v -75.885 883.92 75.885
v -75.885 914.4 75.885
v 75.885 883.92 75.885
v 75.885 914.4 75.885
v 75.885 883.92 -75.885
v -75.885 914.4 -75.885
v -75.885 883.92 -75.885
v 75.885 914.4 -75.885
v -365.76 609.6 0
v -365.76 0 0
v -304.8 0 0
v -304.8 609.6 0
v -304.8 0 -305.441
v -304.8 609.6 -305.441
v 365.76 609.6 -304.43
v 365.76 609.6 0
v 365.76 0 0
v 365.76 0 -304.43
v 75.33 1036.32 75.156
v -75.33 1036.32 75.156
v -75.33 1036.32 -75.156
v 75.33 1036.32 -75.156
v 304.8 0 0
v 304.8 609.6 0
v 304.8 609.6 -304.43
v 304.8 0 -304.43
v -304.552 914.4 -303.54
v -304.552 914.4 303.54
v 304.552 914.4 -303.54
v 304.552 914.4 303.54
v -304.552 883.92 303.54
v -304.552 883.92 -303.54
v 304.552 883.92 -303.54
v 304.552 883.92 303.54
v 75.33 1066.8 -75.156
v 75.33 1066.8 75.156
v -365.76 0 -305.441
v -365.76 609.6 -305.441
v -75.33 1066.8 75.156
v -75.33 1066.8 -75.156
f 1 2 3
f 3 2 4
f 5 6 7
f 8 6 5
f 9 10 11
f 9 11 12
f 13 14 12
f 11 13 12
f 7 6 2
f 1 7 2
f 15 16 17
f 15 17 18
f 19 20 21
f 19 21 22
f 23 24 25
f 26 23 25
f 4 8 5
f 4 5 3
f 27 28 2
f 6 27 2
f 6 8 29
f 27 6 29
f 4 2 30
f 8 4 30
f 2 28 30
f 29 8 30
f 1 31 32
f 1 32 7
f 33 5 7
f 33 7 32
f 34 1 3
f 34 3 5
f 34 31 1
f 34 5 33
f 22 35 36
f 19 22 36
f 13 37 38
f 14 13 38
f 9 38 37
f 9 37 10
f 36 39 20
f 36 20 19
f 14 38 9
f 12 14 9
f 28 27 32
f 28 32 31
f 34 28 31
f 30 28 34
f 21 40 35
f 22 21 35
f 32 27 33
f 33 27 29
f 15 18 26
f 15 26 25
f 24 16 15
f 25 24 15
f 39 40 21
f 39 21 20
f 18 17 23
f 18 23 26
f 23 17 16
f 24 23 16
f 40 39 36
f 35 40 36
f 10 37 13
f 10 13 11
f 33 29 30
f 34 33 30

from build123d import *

# Parameters (mm, degrees)
F1_W      = 609.1041564941
F1_H      = 607.0808172226
F1_W_2    = 151.7698764801
F1_H_2    = 151.7701148987
F2_DEPTH  = 30.48
F7_E6_W   = 305.4414391518
F7_E6_H   = 609.6
F8_DEPTH  = 30.48
F7_E7_W   = 304.4300079346
F7_E7_H   = 609.6
F9_DEPTH  = 30.48
F12_W     = 150.6595611572
F12_H     = 150.3119468689
F13_DEPTH = 30.48


# Not quite as in the source:
# - a feature of the source that left no trace in its solid (it failed there, or was rolled back) is left out
# - a pattern or mirror of a feature is missing from the dataset's text; its kind, count and spacing are read off the source's solid
# - the program builds the solid bodies; features that only make, move or delete a surface that nothing else refers to are left out


with BuildPart() as f2:
    # F1 (on offset) → F2 (new body)
    with BuildSketch(Plane.XZ.offset(-914.4)):
        Rectangle(F1_W, F1_H)
        Rectangle(F1_W_2, F1_H_2, mode=Mode.SUBTRACT)
    extrude(amount=F2_DEPTH)


with BuildPart() as f8:
    # F7_E6 (on explicit) → F8 (new body)
    with BuildSketch(Plane(origin=(-304.8, 0, -305.4414391518), x_dir=(0, 0, 1), z_dir=(-1, 0, 0))):
        with Locations((152.7207195759, 304.8)):
            Rectangle(F7_E6_W, F7_E6_H)
    extrude(amount=F8_DEPTH)

    # F8_copies: F8 across plane


with BuildPart() as f8_1:
    add(f8.part)
    add(f8.part.mirror(Plane(origin=(-335.28, 0, 0), x_dir=(0, 0, -1), z_dir=(-1, 0, 0))))


with BuildPart() as f9:
    # F7_E7 (on explicit) → F9 (new body)
    with BuildSketch(Plane(origin=(304.8, 0, 0), x_dir=(0, 0, -1), z_dir=(1, 0, 0))):
        with Locations((152.2150039673, 304.8)):
            Rectangle(F7_E7_W, F7_E7_H)
    extrude(amount=F9_DEPTH)

    # F9_copies: F9 across plane


with BuildPart() as f9_1:
    add(f9.part)
    add(f9.part.mirror(Plane(origin=(335.28, 0, 0), x_dir=(0, 0, 1), z_dir=(1, 0, 0))))


with BuildPart() as f13:
    # F12 (on offset) → F13 (new body)
    with BuildSketch(Plane.XZ.offset(-1066.8)):
        Rectangle(F12_W, F12_H)
    extrude(amount=F13_DEPTH)


solid = Compound([f2.part, f8_1.part, f9_1.part, f13.part])
